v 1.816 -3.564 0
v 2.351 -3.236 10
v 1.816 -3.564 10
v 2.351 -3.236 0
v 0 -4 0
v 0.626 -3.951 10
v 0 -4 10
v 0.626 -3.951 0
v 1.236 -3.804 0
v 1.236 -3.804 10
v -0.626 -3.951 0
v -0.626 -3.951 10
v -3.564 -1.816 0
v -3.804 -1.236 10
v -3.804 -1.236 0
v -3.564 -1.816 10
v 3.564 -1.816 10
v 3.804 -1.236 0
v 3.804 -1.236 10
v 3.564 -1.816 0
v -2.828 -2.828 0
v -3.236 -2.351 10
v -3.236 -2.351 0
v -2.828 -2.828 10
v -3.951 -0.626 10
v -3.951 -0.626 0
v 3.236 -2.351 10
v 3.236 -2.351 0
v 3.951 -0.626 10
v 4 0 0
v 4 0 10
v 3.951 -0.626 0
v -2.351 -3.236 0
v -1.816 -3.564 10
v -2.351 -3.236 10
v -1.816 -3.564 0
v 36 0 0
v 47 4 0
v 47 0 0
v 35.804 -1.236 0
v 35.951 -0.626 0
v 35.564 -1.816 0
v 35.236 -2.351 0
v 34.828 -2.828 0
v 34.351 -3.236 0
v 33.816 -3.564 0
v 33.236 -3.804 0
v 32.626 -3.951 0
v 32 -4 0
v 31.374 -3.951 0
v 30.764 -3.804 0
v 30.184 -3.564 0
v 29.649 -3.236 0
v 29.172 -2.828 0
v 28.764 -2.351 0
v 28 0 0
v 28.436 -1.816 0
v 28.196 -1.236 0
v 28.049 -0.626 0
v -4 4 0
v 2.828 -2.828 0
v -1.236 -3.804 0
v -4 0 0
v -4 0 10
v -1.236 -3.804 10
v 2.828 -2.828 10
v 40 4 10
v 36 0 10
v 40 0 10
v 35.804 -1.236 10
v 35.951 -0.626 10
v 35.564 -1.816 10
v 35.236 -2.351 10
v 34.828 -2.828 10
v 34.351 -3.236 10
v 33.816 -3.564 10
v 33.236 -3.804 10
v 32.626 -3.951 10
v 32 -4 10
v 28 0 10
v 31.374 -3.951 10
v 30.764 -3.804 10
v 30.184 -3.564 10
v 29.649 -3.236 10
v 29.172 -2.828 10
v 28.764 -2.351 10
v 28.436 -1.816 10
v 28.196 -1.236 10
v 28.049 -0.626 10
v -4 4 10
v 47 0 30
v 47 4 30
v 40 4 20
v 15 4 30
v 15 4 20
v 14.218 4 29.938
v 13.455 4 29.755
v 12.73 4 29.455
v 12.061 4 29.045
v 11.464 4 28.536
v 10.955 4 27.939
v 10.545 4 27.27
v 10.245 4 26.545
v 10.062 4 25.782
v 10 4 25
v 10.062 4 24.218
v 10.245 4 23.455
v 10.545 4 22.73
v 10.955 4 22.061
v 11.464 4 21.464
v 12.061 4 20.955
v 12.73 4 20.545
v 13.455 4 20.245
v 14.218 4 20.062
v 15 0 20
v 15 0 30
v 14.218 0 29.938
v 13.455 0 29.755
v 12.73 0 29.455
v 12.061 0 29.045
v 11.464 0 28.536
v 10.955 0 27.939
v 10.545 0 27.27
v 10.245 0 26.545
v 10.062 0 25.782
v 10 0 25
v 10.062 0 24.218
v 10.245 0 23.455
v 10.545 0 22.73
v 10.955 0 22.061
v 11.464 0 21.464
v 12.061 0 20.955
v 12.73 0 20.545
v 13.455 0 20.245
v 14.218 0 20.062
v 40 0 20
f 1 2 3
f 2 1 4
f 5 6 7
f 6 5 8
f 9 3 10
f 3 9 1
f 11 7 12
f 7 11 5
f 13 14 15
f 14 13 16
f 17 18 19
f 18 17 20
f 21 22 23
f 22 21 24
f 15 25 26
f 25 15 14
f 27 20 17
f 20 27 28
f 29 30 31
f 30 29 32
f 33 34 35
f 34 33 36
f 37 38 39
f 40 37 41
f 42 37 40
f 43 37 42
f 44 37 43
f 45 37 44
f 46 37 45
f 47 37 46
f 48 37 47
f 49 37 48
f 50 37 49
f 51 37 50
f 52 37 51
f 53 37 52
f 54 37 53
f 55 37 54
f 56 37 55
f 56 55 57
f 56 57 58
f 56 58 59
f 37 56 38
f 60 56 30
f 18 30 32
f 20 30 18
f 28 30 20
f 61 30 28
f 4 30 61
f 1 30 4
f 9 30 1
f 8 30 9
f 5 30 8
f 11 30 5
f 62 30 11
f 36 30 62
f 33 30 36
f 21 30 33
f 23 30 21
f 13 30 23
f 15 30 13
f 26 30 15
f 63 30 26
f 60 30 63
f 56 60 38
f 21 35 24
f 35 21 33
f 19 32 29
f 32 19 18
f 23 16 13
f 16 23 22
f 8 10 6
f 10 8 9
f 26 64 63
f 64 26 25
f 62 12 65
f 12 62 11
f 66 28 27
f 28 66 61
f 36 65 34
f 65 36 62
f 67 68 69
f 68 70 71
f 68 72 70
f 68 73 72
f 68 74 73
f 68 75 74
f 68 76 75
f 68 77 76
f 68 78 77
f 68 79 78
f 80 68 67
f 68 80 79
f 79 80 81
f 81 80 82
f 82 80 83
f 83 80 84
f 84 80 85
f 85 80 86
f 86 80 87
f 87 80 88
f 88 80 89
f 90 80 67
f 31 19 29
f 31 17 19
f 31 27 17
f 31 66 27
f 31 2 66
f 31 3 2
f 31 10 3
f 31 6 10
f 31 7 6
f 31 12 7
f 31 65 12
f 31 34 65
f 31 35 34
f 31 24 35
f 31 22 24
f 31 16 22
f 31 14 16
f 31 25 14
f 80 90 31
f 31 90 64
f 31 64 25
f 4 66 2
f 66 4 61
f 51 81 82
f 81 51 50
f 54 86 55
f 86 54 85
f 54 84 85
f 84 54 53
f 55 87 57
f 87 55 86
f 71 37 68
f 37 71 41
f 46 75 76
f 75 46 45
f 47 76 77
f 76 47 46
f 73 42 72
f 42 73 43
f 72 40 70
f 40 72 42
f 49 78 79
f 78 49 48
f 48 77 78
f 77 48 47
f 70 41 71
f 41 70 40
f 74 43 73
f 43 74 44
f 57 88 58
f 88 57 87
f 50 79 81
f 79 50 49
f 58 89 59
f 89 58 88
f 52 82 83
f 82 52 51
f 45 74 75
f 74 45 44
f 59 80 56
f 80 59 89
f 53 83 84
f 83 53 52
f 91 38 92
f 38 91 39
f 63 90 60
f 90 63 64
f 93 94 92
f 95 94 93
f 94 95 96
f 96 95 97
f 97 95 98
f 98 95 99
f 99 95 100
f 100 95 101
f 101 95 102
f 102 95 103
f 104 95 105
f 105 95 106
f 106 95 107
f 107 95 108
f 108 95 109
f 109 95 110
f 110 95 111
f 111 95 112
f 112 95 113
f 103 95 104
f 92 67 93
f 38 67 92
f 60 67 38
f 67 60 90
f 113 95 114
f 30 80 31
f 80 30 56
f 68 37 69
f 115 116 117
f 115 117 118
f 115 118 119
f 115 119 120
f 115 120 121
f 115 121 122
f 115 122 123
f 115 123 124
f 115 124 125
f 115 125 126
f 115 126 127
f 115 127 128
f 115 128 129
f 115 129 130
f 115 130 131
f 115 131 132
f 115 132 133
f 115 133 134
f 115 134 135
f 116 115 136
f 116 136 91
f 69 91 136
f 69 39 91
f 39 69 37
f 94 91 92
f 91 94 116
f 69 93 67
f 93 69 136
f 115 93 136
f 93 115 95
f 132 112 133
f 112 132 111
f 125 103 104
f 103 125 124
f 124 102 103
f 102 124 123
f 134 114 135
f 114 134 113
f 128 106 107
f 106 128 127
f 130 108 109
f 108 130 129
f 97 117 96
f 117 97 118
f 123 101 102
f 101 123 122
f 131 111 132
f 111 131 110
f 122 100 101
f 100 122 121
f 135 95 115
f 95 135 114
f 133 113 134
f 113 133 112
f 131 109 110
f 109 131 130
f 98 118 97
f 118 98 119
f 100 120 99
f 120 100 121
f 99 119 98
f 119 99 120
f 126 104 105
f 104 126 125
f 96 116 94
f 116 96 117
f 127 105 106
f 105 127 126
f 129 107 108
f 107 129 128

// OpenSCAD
spacerLen  = 10;
spacerDia  = 8;
spacerDist = 32;

$fn=40;

cylinder(d=spacerDia, h=spacerLen);
translate([spacerDist,0,0]) cylinder(d=spacerDia, h=spacerLen);
translate([-spacerDia/2,0,0]) cube([spacerDist+spacerDia/2+15,spacerDia/2,spacerLen]);
translate([spacerDist+15-7,0,0]) cube([7,spacerDia/2,spacerLen+20]);
translate([15,0,20]) cube([spacerDist,spacerDia/2,spacerLen]);
translate([15,0,20+spacerLen/2]) rotate([-90,0,0]) cylinder(d=spacerLen, h=spacerDia/2);
